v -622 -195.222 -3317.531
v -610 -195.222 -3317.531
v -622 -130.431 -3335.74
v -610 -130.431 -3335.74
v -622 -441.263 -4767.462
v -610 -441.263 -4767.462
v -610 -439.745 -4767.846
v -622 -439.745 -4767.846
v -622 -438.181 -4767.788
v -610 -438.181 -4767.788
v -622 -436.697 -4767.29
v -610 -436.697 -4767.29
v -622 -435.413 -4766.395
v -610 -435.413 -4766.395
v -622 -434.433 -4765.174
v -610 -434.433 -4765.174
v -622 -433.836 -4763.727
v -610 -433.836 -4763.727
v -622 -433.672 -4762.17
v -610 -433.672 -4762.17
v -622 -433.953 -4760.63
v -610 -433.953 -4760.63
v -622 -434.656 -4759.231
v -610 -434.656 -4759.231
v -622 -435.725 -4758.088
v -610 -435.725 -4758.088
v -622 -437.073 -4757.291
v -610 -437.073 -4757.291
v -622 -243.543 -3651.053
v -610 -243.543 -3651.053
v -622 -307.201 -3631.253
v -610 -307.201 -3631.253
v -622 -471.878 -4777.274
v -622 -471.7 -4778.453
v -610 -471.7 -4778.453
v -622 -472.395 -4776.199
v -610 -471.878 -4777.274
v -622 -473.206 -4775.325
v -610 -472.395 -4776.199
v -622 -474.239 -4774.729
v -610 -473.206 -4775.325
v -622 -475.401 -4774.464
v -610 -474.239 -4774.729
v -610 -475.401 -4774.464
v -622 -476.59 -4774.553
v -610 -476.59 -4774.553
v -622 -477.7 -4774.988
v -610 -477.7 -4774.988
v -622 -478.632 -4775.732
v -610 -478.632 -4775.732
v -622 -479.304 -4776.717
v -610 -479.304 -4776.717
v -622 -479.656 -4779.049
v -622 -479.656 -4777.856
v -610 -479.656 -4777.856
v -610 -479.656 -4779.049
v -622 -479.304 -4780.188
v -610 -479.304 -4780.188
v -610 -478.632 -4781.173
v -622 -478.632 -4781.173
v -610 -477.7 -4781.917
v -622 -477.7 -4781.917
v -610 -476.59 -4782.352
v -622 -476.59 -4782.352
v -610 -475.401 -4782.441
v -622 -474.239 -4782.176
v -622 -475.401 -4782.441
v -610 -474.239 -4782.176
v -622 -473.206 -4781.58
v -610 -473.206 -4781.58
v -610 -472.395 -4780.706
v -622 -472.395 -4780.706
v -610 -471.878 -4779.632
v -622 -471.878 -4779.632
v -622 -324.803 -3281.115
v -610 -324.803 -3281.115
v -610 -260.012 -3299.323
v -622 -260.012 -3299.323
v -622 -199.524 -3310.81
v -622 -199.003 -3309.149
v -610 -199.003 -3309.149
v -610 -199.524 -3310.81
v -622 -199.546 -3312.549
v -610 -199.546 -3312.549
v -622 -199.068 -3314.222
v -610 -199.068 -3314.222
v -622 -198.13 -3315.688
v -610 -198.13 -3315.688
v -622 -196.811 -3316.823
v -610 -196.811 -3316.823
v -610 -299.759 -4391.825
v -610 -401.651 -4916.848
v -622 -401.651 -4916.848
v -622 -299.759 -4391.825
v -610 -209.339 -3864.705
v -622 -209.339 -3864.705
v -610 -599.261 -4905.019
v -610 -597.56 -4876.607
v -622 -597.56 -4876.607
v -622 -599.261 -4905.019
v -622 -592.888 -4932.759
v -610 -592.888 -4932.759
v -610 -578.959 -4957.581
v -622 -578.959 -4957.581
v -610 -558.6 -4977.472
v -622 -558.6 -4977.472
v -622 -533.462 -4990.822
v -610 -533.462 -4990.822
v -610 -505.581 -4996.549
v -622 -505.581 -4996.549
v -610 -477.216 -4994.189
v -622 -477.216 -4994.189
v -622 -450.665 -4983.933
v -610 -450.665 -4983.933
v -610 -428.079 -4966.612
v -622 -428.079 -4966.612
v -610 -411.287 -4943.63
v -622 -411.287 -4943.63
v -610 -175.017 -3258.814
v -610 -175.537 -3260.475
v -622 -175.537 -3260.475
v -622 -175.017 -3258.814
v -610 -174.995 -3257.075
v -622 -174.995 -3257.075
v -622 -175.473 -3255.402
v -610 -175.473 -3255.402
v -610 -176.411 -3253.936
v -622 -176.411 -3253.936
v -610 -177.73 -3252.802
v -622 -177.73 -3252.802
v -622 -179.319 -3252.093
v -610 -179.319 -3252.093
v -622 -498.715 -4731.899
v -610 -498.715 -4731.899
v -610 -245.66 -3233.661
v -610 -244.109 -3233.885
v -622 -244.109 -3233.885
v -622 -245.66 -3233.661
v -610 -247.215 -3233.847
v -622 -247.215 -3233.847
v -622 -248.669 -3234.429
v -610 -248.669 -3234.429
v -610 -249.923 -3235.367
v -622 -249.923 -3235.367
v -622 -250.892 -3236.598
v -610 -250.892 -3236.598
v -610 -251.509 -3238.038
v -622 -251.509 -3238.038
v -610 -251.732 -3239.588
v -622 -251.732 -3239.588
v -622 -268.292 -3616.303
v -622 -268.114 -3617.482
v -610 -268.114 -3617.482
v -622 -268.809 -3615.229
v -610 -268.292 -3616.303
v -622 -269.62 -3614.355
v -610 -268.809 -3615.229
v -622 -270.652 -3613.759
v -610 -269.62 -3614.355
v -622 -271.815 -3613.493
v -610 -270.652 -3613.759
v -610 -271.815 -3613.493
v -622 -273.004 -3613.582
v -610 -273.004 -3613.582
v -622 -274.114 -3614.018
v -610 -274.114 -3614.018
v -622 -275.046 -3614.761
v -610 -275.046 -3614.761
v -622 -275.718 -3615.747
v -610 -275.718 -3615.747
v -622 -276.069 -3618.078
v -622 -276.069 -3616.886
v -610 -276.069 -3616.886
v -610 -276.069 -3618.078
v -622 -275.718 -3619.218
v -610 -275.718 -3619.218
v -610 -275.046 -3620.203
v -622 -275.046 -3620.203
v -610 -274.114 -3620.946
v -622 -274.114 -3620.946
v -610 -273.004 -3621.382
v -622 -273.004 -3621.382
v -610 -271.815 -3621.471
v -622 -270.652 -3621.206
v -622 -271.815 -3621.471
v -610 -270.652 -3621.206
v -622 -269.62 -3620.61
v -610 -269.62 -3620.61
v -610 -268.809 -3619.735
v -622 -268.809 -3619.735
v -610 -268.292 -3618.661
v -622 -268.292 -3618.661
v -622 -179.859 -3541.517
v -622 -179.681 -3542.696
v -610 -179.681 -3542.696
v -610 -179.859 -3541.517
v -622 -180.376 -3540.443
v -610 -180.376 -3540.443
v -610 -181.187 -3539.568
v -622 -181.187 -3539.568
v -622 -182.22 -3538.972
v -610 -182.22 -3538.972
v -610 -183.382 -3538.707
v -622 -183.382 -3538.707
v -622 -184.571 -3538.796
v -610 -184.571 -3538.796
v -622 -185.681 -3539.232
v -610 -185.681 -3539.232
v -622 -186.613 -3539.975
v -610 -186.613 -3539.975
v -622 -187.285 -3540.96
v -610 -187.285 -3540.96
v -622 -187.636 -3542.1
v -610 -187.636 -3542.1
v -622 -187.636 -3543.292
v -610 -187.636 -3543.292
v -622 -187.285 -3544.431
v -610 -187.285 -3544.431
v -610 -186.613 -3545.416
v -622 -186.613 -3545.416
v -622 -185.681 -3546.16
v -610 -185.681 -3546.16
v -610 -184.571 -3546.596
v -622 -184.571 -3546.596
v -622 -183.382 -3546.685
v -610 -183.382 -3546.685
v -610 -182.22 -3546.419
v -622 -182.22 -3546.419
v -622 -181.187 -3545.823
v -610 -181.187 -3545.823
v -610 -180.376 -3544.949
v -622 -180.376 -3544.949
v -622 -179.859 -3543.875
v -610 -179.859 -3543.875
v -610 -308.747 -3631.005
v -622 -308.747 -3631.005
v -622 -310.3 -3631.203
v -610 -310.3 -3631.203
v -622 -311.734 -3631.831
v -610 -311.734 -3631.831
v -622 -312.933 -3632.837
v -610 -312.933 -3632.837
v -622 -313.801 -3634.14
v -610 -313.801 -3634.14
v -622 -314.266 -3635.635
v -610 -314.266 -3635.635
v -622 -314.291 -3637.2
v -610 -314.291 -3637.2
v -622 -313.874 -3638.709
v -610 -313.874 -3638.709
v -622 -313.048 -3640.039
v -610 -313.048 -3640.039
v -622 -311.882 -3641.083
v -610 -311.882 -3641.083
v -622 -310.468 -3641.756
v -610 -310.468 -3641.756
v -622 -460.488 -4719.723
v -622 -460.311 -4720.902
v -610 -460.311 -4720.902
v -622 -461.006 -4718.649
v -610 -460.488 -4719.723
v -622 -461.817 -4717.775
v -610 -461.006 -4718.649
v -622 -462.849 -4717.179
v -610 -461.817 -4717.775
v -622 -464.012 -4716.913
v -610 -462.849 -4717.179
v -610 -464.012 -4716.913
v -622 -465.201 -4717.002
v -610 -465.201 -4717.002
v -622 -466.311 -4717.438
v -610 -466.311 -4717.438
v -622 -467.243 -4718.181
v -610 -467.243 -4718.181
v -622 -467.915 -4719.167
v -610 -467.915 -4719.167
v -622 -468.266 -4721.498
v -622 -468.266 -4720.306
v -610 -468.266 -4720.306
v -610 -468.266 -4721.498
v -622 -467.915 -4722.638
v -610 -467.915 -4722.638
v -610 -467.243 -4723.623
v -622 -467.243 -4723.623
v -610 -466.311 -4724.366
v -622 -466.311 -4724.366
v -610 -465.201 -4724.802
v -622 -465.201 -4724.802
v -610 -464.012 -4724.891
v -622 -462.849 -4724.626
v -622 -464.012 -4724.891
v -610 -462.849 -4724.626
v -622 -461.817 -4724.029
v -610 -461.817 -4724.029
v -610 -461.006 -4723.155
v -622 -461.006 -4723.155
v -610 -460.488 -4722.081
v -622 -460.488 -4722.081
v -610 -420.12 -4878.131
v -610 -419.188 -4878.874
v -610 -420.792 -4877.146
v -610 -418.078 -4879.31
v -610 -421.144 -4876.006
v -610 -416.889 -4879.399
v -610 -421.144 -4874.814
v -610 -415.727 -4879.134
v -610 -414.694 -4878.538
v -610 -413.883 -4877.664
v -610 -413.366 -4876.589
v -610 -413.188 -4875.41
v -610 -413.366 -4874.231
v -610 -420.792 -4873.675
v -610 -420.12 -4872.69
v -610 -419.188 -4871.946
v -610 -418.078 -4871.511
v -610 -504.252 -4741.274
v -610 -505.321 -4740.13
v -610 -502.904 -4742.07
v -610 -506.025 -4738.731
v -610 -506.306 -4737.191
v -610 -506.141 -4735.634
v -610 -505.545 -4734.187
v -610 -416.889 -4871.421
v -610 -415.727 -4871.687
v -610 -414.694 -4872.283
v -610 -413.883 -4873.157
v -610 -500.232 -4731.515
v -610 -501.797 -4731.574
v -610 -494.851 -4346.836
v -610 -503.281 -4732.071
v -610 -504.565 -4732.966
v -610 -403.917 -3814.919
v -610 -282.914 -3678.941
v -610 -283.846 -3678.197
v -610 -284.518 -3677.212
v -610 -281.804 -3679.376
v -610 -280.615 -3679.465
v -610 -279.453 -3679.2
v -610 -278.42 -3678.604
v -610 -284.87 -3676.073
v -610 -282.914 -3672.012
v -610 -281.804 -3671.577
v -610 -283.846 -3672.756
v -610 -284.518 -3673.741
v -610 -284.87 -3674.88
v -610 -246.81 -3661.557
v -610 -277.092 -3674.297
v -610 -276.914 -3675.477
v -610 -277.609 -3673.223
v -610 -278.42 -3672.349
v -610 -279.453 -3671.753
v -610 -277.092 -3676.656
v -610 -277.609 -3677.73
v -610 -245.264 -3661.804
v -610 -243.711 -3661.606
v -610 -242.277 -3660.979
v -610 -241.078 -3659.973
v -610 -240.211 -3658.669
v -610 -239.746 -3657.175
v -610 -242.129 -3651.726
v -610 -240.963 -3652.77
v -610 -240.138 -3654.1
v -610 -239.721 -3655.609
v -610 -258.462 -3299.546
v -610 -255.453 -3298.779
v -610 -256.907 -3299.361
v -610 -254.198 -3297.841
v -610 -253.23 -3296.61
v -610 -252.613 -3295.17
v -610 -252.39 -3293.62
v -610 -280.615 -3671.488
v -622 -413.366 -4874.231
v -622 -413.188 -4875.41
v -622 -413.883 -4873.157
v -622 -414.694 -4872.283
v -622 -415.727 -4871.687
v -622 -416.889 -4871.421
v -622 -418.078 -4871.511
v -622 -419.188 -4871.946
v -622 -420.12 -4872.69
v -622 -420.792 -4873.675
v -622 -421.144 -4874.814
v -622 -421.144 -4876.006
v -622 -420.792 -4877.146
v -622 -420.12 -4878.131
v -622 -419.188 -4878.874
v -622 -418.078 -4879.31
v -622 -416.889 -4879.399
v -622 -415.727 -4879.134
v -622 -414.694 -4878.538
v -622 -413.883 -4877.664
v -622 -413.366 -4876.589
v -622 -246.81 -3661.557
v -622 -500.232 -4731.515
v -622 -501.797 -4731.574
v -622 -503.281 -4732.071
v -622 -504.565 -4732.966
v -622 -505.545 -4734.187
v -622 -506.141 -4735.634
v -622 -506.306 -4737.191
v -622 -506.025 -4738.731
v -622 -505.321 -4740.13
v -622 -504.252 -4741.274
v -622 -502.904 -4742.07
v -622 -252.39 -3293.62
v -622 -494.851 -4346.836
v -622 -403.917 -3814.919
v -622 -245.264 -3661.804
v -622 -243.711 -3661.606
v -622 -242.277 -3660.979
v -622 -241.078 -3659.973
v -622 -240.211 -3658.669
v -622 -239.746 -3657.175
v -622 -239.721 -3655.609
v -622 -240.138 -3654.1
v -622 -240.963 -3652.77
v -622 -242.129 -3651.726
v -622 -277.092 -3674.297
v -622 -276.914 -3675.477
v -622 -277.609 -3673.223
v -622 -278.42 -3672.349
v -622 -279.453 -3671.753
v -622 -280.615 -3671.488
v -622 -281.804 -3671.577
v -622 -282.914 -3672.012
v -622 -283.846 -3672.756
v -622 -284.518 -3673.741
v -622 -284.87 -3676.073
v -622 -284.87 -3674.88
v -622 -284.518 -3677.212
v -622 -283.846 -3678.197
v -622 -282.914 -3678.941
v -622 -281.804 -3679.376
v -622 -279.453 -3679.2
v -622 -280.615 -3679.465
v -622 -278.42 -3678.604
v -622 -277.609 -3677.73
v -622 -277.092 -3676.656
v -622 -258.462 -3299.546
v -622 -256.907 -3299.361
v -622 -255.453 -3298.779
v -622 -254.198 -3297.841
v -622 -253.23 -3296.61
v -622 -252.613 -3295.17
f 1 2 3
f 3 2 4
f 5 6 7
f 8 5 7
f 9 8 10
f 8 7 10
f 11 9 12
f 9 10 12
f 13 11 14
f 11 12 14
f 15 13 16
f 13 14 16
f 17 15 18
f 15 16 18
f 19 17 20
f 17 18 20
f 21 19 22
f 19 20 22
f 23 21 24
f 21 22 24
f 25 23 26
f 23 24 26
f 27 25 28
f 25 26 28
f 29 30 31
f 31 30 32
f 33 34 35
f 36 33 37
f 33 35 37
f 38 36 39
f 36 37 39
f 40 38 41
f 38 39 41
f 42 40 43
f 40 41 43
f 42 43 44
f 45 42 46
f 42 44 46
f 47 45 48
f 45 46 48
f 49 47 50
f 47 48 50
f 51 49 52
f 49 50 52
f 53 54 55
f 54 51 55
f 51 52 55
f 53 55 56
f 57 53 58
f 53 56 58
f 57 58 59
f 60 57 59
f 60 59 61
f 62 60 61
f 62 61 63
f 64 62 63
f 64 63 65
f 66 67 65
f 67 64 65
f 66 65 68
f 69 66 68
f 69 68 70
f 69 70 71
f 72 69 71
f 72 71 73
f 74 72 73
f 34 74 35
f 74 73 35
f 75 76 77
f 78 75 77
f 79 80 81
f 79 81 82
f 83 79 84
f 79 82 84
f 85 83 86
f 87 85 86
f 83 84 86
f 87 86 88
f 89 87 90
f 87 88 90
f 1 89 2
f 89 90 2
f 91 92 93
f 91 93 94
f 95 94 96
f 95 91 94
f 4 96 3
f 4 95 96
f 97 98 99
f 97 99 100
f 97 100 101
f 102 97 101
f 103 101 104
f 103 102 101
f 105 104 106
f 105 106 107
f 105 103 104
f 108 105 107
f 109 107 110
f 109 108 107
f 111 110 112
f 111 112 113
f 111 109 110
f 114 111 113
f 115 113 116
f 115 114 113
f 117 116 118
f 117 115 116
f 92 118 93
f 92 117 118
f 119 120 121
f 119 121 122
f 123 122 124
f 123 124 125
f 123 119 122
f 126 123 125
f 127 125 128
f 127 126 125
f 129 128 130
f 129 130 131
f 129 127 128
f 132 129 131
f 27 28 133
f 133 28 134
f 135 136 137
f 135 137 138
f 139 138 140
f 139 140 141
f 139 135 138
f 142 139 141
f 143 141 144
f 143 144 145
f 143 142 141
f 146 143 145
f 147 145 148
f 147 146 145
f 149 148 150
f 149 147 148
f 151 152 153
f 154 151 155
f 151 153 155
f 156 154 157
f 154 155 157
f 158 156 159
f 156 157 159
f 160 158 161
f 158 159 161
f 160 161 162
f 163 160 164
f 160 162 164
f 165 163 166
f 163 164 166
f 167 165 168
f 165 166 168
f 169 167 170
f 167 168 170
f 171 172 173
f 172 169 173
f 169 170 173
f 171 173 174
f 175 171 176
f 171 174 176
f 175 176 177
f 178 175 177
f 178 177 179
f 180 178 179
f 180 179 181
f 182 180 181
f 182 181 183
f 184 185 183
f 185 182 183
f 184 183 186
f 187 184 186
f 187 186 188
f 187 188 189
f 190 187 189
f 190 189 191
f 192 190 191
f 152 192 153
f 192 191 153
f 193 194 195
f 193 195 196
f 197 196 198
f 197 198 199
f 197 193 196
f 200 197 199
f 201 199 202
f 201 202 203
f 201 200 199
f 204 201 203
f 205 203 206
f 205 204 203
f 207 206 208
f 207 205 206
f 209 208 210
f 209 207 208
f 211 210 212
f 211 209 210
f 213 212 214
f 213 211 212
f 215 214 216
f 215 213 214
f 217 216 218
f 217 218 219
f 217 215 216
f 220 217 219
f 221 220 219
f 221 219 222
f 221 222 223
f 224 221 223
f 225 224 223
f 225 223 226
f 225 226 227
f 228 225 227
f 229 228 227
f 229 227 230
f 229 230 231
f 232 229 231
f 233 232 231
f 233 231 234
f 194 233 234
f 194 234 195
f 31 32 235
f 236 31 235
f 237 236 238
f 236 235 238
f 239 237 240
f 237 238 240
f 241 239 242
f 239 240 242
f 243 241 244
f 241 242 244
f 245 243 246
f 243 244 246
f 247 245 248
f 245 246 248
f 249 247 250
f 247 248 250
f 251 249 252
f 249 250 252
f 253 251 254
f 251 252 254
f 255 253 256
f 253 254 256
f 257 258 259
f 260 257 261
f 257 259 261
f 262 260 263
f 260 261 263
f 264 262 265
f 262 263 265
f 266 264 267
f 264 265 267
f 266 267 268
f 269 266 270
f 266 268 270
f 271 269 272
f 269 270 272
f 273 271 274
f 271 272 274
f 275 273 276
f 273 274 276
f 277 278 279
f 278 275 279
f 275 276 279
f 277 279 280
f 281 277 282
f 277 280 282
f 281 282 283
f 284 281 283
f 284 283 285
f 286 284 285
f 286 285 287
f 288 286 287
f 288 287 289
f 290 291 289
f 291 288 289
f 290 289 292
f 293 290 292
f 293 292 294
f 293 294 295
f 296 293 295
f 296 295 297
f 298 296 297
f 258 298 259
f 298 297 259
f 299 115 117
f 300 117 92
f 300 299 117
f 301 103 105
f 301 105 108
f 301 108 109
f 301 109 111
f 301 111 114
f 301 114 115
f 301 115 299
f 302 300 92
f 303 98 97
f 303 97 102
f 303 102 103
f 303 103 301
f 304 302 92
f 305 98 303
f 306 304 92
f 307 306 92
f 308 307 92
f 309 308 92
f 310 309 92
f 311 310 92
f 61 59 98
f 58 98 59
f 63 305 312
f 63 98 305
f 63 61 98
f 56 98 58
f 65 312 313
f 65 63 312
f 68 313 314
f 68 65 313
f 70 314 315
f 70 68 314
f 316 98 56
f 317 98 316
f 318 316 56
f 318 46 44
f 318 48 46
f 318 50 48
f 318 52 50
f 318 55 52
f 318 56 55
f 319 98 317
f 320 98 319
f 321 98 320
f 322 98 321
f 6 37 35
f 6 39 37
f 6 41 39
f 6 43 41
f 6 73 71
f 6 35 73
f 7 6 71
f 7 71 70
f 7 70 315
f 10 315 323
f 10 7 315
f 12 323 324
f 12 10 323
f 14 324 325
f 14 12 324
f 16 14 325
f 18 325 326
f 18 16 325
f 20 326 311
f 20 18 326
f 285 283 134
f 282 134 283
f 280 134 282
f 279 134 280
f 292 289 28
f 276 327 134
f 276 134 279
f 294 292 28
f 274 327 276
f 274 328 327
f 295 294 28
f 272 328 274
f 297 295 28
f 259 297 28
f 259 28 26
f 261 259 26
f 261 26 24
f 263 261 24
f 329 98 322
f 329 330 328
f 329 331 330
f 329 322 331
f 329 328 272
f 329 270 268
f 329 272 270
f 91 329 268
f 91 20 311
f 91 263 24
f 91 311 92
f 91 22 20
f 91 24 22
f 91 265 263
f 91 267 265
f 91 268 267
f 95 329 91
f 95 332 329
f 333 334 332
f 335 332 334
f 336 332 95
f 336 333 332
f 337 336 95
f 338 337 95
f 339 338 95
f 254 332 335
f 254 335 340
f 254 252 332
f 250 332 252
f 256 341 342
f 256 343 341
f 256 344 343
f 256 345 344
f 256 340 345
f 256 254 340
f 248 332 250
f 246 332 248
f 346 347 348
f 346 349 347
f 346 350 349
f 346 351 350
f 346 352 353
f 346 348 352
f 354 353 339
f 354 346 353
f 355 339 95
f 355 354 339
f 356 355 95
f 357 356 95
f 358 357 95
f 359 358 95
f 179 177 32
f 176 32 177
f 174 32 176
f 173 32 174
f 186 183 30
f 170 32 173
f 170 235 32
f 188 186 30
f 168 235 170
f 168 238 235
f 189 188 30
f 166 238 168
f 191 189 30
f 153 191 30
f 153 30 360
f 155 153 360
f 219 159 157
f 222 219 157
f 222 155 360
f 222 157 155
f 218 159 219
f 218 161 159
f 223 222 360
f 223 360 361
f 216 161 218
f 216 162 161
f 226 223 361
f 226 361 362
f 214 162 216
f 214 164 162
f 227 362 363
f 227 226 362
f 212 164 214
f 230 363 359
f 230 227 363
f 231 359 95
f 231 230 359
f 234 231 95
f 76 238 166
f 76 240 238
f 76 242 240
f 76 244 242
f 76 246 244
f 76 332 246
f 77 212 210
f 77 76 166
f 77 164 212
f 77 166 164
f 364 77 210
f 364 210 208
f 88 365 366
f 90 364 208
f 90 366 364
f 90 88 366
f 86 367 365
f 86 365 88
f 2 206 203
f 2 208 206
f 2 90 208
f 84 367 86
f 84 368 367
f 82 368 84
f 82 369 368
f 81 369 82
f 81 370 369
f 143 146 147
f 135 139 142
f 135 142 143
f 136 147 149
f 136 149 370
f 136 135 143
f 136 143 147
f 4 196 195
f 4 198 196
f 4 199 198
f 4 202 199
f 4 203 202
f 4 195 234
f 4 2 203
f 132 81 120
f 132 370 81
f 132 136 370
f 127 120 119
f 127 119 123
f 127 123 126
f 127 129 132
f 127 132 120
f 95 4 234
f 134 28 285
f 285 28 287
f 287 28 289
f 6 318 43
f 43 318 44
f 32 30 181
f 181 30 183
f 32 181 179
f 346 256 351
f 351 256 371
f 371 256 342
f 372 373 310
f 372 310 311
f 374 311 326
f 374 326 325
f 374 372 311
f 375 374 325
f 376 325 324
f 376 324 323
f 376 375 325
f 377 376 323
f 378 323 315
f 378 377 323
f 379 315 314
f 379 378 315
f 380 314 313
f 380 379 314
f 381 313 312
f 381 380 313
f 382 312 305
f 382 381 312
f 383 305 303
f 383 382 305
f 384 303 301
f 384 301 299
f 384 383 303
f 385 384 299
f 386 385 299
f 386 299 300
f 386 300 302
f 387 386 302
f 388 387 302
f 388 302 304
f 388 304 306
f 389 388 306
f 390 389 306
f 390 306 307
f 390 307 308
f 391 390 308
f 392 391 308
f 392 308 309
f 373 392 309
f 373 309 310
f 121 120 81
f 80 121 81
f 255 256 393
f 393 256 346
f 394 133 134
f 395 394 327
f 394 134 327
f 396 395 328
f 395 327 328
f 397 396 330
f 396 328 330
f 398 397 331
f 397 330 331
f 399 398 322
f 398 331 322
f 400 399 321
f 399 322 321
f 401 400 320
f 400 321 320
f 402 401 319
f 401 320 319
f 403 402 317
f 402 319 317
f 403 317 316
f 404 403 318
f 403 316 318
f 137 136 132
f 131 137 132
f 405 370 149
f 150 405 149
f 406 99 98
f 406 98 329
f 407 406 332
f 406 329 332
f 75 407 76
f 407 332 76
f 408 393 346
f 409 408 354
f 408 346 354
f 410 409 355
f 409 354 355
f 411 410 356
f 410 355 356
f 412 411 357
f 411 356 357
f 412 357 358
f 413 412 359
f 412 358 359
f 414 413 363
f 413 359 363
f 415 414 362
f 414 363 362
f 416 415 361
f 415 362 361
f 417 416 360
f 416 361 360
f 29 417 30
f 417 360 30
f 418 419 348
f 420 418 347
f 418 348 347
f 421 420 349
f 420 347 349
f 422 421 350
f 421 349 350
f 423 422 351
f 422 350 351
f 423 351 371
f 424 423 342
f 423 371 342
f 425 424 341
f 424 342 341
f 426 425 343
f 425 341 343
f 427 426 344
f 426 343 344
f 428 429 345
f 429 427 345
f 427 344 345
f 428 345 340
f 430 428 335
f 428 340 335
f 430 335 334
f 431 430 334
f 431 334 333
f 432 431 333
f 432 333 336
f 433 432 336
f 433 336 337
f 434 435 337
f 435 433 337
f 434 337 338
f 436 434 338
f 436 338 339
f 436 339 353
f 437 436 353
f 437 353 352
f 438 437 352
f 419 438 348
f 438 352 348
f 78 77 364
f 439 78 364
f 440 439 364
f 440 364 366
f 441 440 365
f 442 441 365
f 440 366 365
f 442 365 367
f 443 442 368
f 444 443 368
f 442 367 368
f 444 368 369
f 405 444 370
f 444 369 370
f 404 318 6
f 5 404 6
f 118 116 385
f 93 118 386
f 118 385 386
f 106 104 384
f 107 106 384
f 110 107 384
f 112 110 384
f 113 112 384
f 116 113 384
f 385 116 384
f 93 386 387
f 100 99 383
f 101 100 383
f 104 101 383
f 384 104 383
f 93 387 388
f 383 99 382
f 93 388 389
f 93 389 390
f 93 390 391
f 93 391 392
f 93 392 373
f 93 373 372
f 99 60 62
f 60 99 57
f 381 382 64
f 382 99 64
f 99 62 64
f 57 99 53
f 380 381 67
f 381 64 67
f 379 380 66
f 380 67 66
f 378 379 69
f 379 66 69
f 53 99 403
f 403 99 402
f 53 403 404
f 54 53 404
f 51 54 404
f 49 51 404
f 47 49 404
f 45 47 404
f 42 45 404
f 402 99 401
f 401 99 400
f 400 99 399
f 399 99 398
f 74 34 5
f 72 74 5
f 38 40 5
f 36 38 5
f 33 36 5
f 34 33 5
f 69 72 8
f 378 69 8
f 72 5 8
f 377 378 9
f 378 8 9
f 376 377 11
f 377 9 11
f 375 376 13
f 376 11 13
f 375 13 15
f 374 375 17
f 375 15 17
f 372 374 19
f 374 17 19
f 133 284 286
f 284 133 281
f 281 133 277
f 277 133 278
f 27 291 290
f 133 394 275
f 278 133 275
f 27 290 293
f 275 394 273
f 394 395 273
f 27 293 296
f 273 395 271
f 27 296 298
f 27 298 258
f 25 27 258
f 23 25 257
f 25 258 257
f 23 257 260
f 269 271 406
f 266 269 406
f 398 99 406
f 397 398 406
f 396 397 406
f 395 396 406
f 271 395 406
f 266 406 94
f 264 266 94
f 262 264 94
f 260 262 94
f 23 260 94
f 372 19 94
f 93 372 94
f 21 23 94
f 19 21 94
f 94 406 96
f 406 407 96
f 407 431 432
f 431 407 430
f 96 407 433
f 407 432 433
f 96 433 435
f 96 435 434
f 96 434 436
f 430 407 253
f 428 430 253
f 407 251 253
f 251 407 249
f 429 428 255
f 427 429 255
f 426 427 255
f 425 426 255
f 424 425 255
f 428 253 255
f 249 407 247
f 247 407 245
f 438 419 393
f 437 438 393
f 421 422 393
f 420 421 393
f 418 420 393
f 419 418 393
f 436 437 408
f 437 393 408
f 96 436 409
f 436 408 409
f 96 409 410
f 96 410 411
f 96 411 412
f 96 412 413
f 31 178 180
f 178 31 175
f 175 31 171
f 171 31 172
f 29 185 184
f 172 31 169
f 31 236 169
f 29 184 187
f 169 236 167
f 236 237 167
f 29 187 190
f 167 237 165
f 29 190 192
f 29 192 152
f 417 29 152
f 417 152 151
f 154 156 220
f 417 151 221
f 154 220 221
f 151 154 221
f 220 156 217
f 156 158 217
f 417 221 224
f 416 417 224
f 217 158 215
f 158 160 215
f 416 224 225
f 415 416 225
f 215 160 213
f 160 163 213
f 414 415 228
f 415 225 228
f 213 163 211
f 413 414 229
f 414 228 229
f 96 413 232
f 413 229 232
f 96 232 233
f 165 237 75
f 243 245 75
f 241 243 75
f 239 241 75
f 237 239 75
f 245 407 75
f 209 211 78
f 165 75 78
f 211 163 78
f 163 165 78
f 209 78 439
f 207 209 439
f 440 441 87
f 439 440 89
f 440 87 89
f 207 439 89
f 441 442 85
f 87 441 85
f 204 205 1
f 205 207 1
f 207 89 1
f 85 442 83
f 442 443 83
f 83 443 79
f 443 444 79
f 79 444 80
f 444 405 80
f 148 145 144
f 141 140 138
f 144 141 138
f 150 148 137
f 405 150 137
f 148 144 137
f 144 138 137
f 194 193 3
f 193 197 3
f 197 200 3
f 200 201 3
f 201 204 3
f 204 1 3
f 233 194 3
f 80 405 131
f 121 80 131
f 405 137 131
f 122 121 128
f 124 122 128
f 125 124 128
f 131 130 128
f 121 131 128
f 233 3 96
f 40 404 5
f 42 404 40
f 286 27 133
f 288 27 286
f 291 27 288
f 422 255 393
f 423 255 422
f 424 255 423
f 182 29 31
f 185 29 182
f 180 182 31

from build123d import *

# Parameters (mm, degrees)
PAD007_DEPTH    = 12
SKETCH017_R     = 4
POCKET003_DEPTH = 12.001
SKETCH042_R     = 4
HOLE009_DEPTH   = 610.001


with BuildPart() as side_left_bottom_part:
    # Sketch016 → Pad007 (new body)
    with BuildSketch(Plane.YZ):
        with BuildLine():
            ThreePointArc((-597.560459, -4876.606763), (-519.72621, -4994.682239), (-401.650734, -4916.84799))
            ThreePointArc((-401.650734, -4916.84799), (-253.112342, -4128.51152), (-130.4314, -3335.739529))
            Line((-195.221935, -3317.531256), (-130.4314, -3335.739529))
            ThreePointArc((-199.003331, -3309.149426), (-199.067813, -3314.222405), (-195.221935, -3317.531256))
            Line((-175.537372, -3260.47474), (-199.003331, -3309.149426))
            ThreePointArc((-175.537372, -3260.47474), (-175.47289, -3255.401761), (-179.318768, -3252.09291))
            Line((-244.109303, -3233.884637), (-179.318768, -3252.09291))
            ThreePointArc((-244.109303, -3233.884637), (-249.326998, -3234.856662), (-251.732171, -3239.58787))
            Line((-252.389603, -3293.61975), (-251.732171, -3239.58787))
            ThreePointArc((-260.01247, -3299.322983), (-254.794775, -3298.350957), (-252.389603, -3293.61975))
            Line((-324.803005, -3281.114709), (-260.01247, -3299.322983))
            ThreePointArc((-597.560459, -4876.606763), (-447.909647, -4081.129666), (-324.803005, -3281.114709))
        make_face()
    extrude(amount=PAD007_DEPTH)

    # Sketch017 → Pocket003 (cut, through all)
    with BuildSketch(Plane.YZ):
        with Locations((-464.310755, -4720.902056)):
            Circle(SKETCH017_R)
        with Locations((-475.70018, -4778.452535)):
            Circle(SKETCH017_R)
        with Locations((-272.113802, -3617.482184)):
            Circle(SKETCH017_R)
        with Locations((-280.914226, -3675.476508)):
            Circle(SKETCH017_R)
        with Locations((-130.873609, -2506.378514)):
            Circle(SKETCH017_R)
        with Locations((-137.037316, -2564.720482)):
            Circle(SKETCH017_R)
        with BuildLine():
            ThreePointArc((-63.5924, -1210.755644), (-69.621614, -1215.669765), (-64.707493, -1221.698978))
            Line((-64.707493, -1221.698978), (1.615745, -1228.457117))
            ThreePointArc((1.615745, -1228.457117), (7.644959, -1223.542997), (2.730838, -1217.513783))
            Line((2.730838, -1217.513783), (-63.5924, -1210.755644))
        make_face()
        with BuildLine():
            ThreePointArc((-33.541666, -94.499783), (-39.041666, -99.999783), (-33.541666, -105.499783))
            Line((-33.541666, -105.499783), (33.125001, -105.499783))
            ThreePointArc((33.125001, -105.499783), (38.625001, -99.999783), (33.125001, -94.499783))
            Line((33.125001, -94.499783), (-33.541666, -94.499783))
        make_face()
        with BuildLine():
            ThreePointArc((-165.386078, -2523.207318), (-171.913956, -2527.436597), (-167.684677, -2533.964476))
            Line((-167.684677, -2533.964476), (-102.489783, -2547.895382))
            ThreePointArc((-102.489783, -2547.895382), (-95.961904, -2543.666103), (-100.191183, -2537.138225))
            Line((-100.191183, -2537.138225), (-165.386078, -2523.207318))
        make_face()
        with BuildLine():
            ThreePointArc((-307.201152, -3631.252582), (-314.086519, -3634.870829), (-310.468272, -3641.756197))
            Line((-310.468272, -3641.756197), (-246.81, -3661.556925))
            ThreePointArc((-246.81, -3661.556925), (-239.924632, -3657.938678), (-243.542879, -3651.05331))
            Line((-243.542879, -3651.05331), (-307.201152, -3631.252582))
        make_face()
        with BuildLine():
            ThreePointArc((-498.714671, -4731.898869), (-505.894975, -4734.889394), (-502.90445, -4742.069697))
            Line((-502.90445, -4742.069697), (-441.263063, -4767.462292))
            ThreePointArc((-441.263063, -4767.462292), (-434.082759, -4764.471767), (-437.073284, -4757.291463))
            Line((-437.073284, -4757.291463), (-498.714671, -4731.898869))
        make_face()
    extrude(amount=POCKET003_DEPTH, mode=Mode.SUBTRACT)

    # Sketch042 (on Face1 of ShapeBinder002) → Hole009 (cut, through all)
    with BuildSketch(Plane.YZ.offset(610)):
        with Locations((-183.680954, -3542.695807)):
            Circle(SKETCH042_R)
        with Locations((-417.188268, -4875.410265)):
            Circle(SKETCH042_R)
    extrude(amount=-HOLE009_DEPTH, mode=Mode.SUBTRACT)


with BuildPart() as side_left_bottom_part_1:
    # Body008 placement: moved
    add(side_left_bottom_part.part.moved(Location((610, 0, 0))))


with BuildPart() as side_right_bottom_part:
    # Part__Mirroring004: instance of side_left_bottom_part
    add(side_left_bottom_part_1.part.mirror(Plane(origin=(0, 0, 0), x_dir=(0, -1, 0), z_dir=(1, 0, 0))))


solid = side_right_bottom_part.part
